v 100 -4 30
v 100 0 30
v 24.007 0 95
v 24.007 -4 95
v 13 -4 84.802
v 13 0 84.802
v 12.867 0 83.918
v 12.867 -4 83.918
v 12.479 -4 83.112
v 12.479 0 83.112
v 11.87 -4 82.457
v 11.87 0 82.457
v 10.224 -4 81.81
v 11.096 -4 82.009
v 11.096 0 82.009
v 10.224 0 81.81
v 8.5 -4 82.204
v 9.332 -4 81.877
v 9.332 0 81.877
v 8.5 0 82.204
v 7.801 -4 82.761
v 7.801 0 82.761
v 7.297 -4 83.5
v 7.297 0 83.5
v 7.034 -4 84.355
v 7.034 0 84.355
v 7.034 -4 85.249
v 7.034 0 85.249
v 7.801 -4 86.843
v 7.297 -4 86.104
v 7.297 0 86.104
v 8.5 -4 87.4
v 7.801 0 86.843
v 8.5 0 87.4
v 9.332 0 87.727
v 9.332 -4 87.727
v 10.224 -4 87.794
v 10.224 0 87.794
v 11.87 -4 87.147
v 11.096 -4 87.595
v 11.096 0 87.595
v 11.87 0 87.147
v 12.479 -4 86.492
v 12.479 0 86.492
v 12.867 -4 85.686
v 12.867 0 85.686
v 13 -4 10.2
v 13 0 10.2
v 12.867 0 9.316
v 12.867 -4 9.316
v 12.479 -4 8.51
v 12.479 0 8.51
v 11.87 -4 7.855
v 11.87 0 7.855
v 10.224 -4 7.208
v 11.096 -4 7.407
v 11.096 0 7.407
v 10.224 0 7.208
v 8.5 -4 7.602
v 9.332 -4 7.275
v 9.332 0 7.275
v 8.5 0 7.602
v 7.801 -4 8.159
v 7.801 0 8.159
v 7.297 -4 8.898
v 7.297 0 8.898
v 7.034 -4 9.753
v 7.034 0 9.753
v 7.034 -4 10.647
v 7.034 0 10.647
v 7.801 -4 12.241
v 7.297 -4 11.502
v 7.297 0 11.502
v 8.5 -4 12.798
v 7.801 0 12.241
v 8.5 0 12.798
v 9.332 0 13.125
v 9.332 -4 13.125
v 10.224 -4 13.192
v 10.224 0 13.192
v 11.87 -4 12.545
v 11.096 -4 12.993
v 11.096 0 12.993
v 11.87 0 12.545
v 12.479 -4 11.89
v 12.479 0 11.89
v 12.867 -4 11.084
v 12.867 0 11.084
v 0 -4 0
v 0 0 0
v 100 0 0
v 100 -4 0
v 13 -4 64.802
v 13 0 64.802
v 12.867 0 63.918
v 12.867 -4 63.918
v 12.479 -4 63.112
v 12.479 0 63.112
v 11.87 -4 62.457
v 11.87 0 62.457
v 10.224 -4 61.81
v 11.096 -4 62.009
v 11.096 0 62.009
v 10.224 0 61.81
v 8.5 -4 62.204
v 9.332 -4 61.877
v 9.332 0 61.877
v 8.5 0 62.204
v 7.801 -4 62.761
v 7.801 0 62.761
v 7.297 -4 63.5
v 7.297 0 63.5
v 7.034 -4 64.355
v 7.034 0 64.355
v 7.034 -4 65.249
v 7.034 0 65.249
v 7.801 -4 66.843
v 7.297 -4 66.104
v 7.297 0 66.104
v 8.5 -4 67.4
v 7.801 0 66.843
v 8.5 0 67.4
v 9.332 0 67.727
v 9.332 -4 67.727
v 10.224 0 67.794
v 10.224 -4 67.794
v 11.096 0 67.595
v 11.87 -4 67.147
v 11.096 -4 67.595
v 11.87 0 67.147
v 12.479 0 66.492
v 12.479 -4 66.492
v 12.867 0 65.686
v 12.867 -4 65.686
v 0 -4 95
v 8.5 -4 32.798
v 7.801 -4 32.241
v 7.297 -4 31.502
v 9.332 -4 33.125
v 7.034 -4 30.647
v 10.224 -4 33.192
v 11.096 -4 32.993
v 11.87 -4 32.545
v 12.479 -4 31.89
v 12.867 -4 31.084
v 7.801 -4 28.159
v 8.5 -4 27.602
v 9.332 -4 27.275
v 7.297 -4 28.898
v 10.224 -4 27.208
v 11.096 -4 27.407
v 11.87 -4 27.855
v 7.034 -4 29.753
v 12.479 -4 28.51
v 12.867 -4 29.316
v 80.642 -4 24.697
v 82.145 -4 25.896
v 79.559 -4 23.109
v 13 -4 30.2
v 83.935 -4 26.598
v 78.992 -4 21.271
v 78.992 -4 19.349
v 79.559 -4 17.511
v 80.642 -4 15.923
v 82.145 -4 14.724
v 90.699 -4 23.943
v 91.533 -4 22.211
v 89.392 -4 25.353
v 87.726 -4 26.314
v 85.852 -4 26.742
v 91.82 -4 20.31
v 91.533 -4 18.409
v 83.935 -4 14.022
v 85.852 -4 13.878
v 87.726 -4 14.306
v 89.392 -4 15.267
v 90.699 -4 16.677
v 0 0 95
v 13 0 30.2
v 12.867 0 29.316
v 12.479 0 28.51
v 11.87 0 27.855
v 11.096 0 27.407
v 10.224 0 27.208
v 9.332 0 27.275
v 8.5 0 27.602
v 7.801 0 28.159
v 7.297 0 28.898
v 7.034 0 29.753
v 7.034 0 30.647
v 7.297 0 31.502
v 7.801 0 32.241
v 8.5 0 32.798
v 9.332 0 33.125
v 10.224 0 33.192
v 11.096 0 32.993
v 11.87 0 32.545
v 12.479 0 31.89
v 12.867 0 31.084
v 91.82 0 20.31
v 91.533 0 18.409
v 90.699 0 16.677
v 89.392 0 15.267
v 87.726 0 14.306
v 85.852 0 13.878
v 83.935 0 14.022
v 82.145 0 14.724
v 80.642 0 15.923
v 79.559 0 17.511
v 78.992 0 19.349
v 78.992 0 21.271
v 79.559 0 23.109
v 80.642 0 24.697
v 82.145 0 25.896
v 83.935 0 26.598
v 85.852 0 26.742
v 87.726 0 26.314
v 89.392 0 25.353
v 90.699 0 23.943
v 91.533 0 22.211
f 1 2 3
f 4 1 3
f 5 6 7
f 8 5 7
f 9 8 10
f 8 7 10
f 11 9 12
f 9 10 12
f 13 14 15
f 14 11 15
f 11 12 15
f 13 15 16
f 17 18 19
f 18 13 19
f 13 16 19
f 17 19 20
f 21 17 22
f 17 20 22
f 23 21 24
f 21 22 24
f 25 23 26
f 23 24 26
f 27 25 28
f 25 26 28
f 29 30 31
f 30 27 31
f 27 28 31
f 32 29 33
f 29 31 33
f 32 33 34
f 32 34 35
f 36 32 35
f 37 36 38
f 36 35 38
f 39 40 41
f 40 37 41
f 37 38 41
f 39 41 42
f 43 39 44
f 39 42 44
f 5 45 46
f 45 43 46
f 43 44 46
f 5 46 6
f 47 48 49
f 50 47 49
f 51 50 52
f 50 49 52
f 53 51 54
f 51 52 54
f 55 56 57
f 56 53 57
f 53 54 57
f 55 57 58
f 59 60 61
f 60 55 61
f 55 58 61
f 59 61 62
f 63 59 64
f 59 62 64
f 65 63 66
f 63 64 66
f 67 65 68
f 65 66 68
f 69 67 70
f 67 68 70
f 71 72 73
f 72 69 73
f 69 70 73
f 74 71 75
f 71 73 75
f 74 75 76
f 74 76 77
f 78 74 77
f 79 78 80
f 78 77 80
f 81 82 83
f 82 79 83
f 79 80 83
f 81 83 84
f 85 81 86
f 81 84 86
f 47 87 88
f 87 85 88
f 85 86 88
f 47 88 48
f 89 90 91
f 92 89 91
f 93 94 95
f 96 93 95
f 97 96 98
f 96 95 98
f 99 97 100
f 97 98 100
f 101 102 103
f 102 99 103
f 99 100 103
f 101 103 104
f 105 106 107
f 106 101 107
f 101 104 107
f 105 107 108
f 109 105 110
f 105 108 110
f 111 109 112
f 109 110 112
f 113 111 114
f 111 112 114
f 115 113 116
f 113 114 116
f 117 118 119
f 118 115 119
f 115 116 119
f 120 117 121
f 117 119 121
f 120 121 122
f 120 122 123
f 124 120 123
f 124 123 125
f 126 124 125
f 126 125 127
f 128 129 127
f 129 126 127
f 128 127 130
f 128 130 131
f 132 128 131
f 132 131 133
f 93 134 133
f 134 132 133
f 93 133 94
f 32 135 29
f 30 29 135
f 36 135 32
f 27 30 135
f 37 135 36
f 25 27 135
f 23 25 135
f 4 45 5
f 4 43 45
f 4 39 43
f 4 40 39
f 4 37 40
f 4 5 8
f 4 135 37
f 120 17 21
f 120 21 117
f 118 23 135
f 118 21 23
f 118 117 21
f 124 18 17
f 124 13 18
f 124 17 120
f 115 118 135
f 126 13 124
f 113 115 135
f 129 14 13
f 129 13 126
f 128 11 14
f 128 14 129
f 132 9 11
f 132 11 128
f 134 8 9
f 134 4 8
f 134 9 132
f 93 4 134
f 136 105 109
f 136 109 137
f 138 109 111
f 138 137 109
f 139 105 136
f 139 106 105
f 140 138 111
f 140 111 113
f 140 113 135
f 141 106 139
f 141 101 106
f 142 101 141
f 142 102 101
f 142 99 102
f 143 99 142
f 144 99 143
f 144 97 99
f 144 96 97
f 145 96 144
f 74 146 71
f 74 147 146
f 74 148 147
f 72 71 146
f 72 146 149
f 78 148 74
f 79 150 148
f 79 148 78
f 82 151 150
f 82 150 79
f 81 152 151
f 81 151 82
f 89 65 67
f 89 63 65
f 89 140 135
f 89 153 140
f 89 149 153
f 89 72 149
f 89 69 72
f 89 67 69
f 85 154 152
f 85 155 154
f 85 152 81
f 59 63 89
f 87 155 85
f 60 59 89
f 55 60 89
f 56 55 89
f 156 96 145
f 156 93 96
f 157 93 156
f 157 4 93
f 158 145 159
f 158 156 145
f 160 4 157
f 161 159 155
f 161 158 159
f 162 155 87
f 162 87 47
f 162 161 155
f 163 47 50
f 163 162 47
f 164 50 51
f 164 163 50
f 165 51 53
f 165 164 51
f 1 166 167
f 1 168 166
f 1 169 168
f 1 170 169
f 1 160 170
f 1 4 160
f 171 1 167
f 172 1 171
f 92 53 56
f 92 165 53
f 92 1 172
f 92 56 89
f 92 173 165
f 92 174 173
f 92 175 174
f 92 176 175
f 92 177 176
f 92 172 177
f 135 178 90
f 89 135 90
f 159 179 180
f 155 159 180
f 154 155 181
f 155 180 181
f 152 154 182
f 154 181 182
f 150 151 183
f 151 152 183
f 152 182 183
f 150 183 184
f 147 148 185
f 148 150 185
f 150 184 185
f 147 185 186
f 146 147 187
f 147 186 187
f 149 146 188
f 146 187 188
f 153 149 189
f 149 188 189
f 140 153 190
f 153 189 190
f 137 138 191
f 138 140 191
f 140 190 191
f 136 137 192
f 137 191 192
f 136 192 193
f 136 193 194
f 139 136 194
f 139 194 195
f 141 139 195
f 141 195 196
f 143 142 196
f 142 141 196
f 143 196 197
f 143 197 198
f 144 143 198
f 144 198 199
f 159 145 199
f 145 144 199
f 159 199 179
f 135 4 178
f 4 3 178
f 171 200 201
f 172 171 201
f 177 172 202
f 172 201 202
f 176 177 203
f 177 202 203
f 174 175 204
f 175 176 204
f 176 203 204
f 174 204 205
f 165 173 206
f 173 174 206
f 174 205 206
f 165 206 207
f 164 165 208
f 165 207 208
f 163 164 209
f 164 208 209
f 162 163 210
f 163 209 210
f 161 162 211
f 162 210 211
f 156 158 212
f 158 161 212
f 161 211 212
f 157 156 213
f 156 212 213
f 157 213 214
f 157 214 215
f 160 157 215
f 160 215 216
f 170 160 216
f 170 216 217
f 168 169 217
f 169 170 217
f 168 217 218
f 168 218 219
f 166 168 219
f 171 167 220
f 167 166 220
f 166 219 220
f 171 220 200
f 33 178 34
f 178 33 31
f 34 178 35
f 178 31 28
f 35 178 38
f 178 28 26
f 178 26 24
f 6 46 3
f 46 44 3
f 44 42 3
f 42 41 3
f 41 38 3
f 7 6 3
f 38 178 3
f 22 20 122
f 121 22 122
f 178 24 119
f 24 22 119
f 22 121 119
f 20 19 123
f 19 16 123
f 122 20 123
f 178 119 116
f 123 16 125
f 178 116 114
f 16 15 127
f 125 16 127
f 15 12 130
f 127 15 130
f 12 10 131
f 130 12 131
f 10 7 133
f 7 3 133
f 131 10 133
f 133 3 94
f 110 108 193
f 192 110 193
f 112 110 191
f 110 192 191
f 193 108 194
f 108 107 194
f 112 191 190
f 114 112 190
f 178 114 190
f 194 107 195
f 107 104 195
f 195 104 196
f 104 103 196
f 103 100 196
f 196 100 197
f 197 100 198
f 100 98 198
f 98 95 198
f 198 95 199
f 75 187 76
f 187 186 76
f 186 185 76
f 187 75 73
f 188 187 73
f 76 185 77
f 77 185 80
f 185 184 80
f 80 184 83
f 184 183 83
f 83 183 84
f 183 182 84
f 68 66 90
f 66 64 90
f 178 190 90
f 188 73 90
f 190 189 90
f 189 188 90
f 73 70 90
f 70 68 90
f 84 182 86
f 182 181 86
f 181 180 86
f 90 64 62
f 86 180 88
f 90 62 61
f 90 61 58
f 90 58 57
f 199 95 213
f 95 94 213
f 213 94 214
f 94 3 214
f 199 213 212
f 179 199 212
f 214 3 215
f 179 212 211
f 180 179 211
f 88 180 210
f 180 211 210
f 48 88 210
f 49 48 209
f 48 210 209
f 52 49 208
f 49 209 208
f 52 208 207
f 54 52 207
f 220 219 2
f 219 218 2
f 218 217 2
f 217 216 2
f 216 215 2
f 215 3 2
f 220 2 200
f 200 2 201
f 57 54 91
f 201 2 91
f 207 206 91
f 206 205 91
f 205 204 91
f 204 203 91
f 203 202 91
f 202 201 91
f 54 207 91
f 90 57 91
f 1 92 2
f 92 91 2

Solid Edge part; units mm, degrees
sketch "Sketch1" plane through (0, 0, 0) normal (0, -1, 0) x (1, 0, 0)
  circle A0 centre (10, 10.2) radius 3
  circle A1 centre (85.37, 20.31) radius 6.45
  circle A2 centre (10, 30.2) radius 3
  line L0 (24.0066, 95) -> (0, 95)
  line L1 (0, 95) -> (0, 0)
  line L2 (0, 0) -> (100, 0)
  line L3 (100, 0) -> (100, 30)
  line L4 (100, 30) -> (24.0066, 95)
  circle A3 centre (10, 84.802) radius 3
  circle A4 centre (10, 64.802) radius 3
  dimension "D1" = 85.37
  dimension "D2" = 20.31
  dimension "D3" = 30
  dimension "D4" = 100
  dimension "D5" = 100
  dimension "D6" = 95
  dimension "D7" = 12.9
  dimension "D8" = 10
  dimension "D9" = 10.198
  dimension "D10" = 6
  dimension "D11" = 10.2
  dimension "D12" = 20
  dimension "D13" = 20
  dimension "D14" = 34.602
extrude "Protrusion1" add sketch "Sketch1" along normal blind 4
